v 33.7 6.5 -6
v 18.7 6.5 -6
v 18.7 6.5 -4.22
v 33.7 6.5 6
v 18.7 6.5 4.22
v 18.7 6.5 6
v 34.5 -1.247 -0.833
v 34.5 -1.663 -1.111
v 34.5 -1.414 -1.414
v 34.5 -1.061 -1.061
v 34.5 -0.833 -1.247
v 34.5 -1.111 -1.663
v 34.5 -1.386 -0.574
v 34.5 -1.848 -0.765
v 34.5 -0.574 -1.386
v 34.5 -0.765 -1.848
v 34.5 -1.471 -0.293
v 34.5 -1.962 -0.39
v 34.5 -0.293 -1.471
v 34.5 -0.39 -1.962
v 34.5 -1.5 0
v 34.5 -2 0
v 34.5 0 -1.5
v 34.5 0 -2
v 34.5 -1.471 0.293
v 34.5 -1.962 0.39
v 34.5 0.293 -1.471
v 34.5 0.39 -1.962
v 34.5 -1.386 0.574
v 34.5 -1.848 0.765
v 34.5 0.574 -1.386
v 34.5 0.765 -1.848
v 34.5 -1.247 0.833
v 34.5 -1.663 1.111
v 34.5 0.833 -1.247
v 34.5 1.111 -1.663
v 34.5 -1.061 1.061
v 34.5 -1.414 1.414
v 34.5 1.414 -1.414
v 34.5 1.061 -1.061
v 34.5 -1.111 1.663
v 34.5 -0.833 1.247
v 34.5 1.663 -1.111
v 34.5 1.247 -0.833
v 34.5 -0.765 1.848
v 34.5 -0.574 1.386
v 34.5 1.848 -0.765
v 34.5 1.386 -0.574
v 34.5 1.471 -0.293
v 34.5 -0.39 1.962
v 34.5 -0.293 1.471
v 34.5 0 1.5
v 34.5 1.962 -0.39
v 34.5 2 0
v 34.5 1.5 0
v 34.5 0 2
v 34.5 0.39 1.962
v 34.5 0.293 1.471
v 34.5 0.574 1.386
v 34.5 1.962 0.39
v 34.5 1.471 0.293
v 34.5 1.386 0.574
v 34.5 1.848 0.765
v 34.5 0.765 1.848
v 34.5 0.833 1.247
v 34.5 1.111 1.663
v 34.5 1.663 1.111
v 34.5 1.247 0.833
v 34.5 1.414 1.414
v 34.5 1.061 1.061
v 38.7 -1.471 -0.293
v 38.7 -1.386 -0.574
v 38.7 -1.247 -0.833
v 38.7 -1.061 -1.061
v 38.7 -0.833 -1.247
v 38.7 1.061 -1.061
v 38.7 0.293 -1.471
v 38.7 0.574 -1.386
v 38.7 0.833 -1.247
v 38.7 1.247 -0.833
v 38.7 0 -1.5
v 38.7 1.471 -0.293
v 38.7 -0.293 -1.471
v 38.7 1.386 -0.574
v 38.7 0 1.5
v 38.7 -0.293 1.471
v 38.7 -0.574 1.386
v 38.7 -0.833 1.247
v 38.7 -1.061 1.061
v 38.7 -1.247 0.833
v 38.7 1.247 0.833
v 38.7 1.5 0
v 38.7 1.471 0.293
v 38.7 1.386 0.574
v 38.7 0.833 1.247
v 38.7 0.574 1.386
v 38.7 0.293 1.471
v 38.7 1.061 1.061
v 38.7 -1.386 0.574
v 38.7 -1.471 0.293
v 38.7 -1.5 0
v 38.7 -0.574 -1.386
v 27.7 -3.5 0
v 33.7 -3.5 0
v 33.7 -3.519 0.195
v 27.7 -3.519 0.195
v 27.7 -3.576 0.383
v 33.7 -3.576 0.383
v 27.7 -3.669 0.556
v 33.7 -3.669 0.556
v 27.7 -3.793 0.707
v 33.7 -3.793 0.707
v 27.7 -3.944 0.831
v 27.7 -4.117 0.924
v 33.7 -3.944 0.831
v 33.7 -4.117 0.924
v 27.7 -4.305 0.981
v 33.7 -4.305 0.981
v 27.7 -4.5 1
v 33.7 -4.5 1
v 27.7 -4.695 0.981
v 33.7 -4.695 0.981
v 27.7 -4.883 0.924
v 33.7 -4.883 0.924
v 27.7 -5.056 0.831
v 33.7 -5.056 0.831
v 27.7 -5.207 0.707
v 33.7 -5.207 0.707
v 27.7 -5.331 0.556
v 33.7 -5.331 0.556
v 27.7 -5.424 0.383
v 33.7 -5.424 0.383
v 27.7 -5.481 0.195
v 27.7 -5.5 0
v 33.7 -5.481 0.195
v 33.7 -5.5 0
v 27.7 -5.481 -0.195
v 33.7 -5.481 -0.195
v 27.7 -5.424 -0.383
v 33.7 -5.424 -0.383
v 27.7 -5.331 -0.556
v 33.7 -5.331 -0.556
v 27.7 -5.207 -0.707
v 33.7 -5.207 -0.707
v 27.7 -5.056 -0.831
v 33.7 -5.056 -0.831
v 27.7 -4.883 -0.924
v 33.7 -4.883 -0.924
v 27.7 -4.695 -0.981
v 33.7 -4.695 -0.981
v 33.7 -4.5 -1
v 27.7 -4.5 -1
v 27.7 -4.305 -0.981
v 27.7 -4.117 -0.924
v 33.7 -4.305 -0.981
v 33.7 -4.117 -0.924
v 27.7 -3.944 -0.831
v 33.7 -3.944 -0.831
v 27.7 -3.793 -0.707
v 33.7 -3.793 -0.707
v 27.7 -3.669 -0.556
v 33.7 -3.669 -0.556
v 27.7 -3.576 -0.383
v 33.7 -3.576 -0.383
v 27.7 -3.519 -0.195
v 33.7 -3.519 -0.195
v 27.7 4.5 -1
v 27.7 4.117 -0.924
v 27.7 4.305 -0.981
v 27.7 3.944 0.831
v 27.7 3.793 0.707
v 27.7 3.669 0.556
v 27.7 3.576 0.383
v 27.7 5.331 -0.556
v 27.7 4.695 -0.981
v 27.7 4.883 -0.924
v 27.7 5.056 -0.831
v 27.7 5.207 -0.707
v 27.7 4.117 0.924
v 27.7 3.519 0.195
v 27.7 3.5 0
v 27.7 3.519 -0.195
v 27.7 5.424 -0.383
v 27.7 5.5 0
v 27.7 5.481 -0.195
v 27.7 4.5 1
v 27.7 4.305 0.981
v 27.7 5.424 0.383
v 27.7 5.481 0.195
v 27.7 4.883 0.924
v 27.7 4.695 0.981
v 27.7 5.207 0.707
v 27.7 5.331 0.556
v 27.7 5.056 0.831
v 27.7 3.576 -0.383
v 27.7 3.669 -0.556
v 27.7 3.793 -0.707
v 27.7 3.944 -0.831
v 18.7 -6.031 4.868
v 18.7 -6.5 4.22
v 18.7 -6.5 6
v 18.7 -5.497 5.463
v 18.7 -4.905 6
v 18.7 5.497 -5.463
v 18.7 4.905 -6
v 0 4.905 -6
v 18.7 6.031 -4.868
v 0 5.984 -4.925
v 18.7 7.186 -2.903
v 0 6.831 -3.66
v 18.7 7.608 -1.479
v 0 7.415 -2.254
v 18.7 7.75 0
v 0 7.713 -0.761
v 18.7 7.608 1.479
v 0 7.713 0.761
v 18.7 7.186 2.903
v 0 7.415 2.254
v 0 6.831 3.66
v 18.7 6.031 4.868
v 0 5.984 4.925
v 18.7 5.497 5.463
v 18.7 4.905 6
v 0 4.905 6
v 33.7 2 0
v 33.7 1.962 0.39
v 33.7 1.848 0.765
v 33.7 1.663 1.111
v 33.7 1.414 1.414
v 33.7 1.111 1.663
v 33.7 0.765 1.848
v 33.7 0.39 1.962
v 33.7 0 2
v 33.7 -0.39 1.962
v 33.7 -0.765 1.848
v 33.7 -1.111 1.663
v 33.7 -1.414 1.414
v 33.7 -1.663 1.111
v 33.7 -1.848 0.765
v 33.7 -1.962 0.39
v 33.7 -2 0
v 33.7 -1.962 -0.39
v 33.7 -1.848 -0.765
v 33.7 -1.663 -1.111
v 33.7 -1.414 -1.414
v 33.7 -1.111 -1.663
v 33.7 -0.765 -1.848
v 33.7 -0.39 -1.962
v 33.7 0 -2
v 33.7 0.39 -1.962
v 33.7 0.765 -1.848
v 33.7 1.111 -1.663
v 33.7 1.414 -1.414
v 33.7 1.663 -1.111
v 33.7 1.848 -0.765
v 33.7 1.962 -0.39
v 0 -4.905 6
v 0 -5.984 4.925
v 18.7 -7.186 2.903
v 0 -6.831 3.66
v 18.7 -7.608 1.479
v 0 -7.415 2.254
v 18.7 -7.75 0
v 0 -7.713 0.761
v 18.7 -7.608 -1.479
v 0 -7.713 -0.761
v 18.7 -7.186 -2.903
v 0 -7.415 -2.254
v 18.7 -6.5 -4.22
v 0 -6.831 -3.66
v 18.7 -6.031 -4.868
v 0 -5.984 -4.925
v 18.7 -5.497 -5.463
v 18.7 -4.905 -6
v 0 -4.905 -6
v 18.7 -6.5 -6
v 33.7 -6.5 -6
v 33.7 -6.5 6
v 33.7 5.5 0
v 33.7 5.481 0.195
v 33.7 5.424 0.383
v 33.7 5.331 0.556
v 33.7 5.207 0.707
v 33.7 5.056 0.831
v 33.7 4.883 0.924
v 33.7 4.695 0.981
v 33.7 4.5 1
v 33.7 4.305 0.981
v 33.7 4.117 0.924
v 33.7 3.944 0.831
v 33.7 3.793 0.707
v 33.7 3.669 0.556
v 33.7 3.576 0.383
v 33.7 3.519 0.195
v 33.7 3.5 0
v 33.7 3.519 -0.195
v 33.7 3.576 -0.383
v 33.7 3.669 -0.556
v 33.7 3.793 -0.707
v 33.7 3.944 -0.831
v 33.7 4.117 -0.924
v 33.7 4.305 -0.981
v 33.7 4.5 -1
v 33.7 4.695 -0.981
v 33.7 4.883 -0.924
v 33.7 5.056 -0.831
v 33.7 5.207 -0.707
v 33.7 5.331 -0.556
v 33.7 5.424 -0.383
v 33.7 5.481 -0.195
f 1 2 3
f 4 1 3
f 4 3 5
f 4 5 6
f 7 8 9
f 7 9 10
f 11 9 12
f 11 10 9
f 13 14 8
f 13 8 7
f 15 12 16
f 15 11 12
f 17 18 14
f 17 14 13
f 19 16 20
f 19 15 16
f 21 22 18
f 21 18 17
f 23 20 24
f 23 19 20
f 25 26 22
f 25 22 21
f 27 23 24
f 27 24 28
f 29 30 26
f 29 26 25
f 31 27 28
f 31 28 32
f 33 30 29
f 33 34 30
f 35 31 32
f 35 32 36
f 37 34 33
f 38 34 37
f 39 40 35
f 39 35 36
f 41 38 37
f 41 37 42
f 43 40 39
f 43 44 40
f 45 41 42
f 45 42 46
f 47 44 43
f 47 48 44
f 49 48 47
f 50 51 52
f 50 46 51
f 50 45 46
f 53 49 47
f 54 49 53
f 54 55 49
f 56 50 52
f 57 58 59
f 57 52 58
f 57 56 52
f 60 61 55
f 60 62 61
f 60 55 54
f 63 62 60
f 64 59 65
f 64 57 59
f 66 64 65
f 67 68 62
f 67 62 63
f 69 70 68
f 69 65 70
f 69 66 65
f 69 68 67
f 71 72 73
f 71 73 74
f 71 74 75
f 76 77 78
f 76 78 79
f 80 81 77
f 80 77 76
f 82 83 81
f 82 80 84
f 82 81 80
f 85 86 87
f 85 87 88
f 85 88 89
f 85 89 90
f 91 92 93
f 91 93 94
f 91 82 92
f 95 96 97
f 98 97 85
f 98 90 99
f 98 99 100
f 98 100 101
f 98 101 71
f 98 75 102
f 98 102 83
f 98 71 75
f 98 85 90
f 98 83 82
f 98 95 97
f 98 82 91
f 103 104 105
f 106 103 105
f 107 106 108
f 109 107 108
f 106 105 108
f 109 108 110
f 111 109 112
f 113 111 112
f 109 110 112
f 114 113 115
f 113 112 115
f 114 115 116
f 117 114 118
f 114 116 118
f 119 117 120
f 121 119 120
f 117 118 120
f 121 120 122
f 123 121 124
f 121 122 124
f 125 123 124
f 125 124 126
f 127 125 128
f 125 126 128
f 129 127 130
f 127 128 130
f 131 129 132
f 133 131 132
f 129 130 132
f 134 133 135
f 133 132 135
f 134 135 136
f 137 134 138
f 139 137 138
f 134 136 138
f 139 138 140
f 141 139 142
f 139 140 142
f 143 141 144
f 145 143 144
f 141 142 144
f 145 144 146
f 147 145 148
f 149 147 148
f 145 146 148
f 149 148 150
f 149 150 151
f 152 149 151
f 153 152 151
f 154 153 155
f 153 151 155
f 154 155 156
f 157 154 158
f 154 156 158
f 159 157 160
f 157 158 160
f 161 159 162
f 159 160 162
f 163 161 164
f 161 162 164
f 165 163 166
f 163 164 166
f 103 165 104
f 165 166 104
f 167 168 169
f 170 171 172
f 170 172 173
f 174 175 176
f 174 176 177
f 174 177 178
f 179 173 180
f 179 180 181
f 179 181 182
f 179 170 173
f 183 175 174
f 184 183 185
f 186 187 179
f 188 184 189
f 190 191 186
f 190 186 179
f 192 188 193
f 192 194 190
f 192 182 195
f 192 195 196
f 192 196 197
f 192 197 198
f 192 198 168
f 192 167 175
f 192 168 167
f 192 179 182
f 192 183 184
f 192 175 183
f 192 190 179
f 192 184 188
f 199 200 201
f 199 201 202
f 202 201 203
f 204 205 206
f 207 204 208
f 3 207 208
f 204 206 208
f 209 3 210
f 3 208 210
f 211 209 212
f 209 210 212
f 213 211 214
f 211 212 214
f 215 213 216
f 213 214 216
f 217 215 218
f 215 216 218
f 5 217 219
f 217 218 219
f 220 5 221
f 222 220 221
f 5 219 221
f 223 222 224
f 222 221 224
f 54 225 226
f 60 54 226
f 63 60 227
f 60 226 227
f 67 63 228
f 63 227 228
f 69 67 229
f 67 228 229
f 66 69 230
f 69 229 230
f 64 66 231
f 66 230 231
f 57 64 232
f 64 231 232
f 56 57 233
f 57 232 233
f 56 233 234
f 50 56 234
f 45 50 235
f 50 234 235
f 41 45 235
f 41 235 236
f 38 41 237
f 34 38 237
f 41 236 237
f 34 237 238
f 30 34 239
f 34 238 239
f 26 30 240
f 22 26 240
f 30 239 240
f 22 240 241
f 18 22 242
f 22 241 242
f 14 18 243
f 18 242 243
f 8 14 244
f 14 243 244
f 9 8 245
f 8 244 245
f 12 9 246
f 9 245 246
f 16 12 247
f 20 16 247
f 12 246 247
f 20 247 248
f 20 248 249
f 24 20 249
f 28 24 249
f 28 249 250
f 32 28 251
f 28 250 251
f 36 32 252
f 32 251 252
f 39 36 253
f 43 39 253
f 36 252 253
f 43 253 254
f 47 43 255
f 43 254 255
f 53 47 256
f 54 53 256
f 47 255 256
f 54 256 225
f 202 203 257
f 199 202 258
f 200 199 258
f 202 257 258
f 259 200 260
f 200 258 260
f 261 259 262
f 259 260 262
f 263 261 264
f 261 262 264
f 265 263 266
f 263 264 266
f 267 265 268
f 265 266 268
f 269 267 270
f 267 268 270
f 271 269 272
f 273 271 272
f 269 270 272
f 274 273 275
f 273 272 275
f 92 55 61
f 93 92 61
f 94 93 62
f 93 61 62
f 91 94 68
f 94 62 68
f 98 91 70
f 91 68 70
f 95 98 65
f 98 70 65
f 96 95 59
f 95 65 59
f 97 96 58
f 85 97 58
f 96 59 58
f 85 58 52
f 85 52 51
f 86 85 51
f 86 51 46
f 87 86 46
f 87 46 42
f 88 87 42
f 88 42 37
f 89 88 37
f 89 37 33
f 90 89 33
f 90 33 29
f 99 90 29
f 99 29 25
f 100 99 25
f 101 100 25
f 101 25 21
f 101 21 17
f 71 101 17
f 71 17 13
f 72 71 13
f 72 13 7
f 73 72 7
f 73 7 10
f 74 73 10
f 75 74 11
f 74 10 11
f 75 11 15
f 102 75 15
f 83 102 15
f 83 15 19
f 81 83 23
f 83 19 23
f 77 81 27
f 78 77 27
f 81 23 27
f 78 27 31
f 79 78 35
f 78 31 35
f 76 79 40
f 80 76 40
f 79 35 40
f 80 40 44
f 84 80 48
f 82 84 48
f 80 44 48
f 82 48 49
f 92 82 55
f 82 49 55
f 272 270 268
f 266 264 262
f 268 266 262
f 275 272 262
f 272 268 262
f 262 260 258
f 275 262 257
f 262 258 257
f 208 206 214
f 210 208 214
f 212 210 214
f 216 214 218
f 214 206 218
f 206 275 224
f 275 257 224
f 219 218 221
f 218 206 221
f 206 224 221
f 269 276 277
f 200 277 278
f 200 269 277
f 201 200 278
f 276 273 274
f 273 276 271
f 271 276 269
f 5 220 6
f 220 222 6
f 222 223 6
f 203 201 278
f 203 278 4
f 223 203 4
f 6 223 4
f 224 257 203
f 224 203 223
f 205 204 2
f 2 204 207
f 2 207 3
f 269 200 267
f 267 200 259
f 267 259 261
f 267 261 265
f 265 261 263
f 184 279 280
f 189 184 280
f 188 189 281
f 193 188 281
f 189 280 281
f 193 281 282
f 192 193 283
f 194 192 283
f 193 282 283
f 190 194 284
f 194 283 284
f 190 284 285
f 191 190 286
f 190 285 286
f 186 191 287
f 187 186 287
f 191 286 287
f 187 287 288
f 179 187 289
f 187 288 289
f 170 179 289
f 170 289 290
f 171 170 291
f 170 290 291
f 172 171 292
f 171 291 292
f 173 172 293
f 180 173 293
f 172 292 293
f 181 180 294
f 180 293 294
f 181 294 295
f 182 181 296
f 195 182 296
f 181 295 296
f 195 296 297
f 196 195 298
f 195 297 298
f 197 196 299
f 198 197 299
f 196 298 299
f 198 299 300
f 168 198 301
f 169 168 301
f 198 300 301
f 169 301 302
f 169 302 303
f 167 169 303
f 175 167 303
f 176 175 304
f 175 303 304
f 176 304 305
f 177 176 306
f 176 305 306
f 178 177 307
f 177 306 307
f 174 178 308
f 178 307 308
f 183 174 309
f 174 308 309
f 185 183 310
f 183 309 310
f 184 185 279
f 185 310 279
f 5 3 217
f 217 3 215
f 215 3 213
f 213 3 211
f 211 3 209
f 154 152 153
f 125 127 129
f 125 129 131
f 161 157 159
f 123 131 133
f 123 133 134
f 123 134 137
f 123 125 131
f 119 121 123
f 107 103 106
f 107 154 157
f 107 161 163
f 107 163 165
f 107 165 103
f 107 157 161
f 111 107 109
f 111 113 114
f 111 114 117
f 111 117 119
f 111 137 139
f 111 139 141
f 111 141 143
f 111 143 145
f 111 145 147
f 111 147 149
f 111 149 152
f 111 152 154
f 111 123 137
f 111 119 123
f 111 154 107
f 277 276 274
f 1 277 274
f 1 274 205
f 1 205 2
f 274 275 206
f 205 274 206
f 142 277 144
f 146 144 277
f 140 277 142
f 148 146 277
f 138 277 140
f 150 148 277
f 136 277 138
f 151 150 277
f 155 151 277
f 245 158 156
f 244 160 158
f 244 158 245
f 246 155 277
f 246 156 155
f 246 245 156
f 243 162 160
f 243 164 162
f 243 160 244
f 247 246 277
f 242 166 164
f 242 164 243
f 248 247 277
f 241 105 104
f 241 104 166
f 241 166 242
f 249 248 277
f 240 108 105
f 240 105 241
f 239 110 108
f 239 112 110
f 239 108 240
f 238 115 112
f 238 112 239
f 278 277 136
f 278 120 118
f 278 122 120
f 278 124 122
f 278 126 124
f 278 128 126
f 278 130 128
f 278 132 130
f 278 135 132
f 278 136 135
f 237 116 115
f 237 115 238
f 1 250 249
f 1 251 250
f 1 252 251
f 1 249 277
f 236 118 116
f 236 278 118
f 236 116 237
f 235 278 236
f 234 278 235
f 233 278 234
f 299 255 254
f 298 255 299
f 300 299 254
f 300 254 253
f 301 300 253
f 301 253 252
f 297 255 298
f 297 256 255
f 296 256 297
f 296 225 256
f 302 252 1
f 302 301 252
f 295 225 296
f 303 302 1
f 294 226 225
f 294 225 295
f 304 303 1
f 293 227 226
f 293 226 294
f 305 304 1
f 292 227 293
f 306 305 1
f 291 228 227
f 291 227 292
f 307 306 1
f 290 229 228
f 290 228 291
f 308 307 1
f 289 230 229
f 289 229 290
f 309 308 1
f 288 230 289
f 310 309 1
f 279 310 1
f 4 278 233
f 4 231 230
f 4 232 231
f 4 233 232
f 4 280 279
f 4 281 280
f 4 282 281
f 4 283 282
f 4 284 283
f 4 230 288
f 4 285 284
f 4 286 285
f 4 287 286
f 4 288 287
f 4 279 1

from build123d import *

# Parameters (mm, degrees)
F1_DEPTH = 18.7
F2_W     = 13
F2_H     = 12
F3_DEPTH = 15
F4_R     = 1.5
F5_DEPTH = 5
F4_R_2   = 1
F6_DEPTH = 6
F4_R_3   = 2
F7_DEPTH = 0.8


with BuildPart() as f1:
    # F0 (on Right) → F1 (new body)
    with BuildSketch(Plane.YZ):
        with BuildLine():
            Line((4.905354, 6), (-4.905354, 6))
            ThreePointArc((-4.905354, 6), (-7.75, 0), (-4.905354, -6))
            Line((-4.905354, -6), (4.905354, -6))
            ThreePointArc((4.905354, -6), (7.75, 0), (4.905354, 6))
        make_face()
    extrude(amount=F1_DEPTH)

    # F2 (on face) → F3 (join)
    with BuildSketch(Plane.YZ.offset(18.7)):
        Rectangle(F2_W, F2_H)
    extrude(amount=F3_DEPTH)

    # F4 (on face) → F5 (join)
    with BuildSketch(Plane.YZ.offset(33.7)):
        Circle(F4_R)
    extrude(amount=F5_DEPTH)

    # F4 (on face) → F6 (cut)
    with BuildSketch(Plane.YZ.offset(33.7)):
        with Locations((-4.5, 0)):
            Circle(F4_R_2)
        with Locations((4.5, 0)):
            Circle(F4_R_2)
    extrude(amount=-F6_DEPTH, mode=Mode.SUBTRACT)

    # F4 (on face) → F7 (join)
    with BuildSketch(Plane.YZ.offset(33.7)):
        Circle(F4_R_3)
        Circle(F4_R, mode=Mode.SUBTRACT)
    extrude(amount=F7_DEPTH)


solid = f1.part
